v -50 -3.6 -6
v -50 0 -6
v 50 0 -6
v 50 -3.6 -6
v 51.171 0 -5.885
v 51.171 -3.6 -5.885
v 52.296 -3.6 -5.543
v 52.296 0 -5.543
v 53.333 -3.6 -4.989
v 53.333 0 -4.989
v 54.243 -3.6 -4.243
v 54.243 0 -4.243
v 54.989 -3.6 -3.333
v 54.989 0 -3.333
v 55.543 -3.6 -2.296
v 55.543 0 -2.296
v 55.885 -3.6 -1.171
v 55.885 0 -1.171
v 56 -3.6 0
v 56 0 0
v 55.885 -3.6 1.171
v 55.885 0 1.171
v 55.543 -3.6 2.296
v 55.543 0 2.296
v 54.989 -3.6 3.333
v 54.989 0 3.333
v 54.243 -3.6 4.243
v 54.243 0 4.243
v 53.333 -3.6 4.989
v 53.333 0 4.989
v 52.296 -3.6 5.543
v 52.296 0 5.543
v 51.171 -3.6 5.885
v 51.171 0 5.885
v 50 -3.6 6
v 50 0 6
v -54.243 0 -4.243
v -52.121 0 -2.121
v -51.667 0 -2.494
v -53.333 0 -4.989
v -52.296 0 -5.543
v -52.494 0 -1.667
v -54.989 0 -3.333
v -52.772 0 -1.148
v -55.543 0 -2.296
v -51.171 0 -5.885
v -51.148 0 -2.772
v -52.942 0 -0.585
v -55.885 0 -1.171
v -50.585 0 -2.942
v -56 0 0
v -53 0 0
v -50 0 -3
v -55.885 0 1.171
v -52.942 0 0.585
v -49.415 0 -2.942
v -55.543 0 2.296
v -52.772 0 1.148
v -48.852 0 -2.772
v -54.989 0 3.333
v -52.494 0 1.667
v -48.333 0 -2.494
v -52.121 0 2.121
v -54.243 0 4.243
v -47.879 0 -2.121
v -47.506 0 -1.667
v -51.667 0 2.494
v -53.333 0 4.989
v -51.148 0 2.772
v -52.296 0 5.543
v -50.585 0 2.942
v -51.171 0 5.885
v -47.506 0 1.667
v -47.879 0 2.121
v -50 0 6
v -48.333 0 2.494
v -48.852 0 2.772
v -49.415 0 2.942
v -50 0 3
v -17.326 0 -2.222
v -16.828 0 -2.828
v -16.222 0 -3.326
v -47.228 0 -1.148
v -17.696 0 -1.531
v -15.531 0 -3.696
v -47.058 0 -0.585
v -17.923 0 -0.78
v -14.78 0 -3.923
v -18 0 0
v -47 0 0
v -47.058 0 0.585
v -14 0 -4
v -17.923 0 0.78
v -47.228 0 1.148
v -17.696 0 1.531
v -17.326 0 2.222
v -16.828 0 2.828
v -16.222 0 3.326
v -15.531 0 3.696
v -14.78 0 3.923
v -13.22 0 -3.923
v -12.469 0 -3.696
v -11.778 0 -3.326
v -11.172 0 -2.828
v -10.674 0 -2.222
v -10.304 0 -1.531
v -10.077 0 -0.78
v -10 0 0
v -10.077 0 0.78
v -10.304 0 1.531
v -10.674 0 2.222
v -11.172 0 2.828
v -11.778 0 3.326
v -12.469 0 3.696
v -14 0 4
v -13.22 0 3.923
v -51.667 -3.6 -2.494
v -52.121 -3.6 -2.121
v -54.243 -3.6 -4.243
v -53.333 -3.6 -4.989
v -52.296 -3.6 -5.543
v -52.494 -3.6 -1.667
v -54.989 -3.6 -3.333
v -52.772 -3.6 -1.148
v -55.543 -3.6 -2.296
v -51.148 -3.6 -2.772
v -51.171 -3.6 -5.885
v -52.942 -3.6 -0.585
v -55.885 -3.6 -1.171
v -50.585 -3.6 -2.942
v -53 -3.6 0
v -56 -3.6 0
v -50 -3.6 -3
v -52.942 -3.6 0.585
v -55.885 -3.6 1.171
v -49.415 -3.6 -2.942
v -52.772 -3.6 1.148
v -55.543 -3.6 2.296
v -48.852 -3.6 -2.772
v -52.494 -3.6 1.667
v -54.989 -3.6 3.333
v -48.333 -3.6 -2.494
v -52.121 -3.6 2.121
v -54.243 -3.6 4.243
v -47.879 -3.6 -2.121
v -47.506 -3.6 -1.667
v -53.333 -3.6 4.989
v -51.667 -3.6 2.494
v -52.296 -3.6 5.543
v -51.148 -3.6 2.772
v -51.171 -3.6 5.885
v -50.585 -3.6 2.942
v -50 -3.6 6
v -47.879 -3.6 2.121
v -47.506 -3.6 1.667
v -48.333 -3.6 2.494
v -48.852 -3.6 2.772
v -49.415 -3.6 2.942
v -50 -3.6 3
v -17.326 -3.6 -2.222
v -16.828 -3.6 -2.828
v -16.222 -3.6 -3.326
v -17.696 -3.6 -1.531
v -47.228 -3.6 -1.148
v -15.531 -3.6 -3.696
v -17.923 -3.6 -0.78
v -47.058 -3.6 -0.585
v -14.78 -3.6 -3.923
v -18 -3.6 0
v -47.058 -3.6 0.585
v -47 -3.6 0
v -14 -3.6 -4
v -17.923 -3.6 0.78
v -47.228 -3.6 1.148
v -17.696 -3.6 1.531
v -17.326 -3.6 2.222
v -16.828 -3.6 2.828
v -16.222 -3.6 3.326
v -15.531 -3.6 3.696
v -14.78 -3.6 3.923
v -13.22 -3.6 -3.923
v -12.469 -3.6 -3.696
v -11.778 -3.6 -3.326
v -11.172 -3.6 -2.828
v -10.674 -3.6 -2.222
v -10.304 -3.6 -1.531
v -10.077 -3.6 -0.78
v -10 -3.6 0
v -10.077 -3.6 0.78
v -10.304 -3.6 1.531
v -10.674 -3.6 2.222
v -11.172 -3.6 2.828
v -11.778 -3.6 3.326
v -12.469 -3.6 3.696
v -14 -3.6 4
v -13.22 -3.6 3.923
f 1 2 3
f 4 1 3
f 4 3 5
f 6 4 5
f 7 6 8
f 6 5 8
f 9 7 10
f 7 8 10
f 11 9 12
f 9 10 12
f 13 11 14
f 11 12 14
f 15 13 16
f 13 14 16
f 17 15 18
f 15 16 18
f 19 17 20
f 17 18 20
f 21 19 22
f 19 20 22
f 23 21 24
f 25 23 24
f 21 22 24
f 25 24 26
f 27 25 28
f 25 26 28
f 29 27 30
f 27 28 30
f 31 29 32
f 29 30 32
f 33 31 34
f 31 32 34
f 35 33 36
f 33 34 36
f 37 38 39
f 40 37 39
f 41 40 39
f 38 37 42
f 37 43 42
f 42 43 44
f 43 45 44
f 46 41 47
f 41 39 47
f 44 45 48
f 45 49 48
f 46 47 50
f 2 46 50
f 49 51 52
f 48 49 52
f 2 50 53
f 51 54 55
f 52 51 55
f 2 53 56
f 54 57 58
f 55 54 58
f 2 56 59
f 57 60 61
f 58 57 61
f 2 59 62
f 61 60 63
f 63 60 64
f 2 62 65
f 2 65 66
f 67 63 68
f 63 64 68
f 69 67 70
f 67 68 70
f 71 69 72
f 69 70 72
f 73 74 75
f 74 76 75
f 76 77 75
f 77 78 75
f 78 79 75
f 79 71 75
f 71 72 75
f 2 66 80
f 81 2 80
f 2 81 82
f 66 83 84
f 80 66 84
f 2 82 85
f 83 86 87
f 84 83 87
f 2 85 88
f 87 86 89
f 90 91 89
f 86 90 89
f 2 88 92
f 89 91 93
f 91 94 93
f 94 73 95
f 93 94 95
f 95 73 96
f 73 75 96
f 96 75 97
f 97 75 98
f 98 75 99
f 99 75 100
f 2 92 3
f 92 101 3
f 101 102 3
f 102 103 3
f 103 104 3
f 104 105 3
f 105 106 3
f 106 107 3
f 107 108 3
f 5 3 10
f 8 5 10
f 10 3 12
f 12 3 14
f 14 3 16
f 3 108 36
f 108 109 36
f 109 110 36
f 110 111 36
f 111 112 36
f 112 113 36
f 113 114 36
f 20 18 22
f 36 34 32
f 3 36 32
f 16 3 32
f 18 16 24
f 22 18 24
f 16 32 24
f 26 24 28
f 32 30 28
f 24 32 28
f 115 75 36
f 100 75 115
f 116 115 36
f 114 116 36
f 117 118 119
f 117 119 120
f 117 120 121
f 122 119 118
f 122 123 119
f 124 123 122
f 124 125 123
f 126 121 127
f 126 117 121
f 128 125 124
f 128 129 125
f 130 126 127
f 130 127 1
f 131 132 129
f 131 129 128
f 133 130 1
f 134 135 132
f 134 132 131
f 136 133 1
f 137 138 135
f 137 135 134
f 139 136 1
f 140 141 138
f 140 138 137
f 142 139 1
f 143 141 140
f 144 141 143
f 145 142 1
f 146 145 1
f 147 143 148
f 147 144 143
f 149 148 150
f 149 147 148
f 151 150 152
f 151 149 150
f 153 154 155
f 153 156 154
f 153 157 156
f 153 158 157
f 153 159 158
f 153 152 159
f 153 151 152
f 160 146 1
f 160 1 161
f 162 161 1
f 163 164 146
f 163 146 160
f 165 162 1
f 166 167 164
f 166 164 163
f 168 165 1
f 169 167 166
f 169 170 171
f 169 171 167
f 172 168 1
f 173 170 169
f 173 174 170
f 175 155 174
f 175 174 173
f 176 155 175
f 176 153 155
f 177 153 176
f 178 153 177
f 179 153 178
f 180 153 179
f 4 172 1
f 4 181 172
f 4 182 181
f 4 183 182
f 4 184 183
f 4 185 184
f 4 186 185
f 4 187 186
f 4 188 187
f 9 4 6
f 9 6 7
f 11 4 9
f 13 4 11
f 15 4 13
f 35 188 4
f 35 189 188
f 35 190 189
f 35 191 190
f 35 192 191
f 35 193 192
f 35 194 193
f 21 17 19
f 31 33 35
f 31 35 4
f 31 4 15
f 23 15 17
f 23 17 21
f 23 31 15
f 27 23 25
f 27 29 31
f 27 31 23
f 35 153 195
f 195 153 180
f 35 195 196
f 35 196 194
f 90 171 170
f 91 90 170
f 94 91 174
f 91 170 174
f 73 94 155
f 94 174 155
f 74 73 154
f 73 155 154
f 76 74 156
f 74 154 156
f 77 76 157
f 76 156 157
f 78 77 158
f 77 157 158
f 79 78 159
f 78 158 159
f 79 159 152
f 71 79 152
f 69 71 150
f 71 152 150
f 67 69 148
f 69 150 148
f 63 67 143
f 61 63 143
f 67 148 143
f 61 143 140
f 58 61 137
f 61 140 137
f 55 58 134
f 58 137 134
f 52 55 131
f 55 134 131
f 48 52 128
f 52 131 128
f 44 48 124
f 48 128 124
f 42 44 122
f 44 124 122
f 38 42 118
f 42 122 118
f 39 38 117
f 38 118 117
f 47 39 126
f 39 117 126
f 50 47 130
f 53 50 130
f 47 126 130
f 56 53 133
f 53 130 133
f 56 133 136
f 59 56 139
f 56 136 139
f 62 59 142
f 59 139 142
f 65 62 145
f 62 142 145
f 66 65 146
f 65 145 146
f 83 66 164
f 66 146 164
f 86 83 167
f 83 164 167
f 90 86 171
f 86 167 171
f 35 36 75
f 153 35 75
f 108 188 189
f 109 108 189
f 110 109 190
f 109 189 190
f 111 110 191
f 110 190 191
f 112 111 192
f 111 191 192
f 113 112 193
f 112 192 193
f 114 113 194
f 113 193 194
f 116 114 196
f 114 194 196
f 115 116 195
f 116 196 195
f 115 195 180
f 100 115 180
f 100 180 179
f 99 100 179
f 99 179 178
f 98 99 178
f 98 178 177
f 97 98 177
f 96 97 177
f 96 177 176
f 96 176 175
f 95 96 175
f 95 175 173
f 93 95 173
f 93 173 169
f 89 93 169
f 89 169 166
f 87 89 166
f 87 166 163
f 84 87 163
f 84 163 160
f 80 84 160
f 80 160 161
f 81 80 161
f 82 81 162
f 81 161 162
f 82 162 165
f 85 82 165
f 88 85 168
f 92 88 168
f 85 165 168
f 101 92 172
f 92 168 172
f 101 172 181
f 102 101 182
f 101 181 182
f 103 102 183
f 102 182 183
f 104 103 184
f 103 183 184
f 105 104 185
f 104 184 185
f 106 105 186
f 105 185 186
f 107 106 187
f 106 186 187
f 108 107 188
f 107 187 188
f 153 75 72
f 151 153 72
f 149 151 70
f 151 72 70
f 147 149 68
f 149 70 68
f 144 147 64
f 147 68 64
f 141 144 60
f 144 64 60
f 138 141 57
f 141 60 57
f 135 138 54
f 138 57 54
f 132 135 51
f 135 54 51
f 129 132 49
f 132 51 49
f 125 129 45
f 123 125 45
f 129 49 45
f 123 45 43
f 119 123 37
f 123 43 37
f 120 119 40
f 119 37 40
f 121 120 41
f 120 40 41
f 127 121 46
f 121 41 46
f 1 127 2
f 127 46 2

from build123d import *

# Parameters (mm, degrees)
F1_DEPTH = 3.6
F2_R     = 3
F3_DEPTH = 3.6
F4_R     = 4
F5_DEPTH = 3.601


# Not quite as in the source:
# - a feature names something its author has since deleted; it is built from what else it names


with BuildPart() as f1:
    # F0 (on Front) → F1 (new body)
    with BuildSketch(Plane.XZ):
        with BuildLine():
            Line((50, 6), (-50, 6))
            ThreePointArc((-50, 6), (-56, 0), (-50, -6))
            Line((-50, -6), (50, -6))
            ThreePointArc((50, -6), (56, 0), (50, 6))
        make_face()
    extrude(amount=F1_DEPTH)

    # F2 (on face) → F3 (cut, through all)
    with BuildSketch(Plane.XZ.offset(3.6)):
        with Locations((-50, 0)):
            Circle(F2_R)
    extrude(amount=-F3_DEPTH, mode=Mode.SUBTRACT)

    # F4 (on face) → F5 (cut, through all)
    with BuildSketch(Plane.XZ.offset(3.6)):
        with Locations((-14, 0)):
            Circle(F4_R)
    extrude(amount=-F5_DEPTH, mode=Mode.SUBTRACT)


solid = f1.part
